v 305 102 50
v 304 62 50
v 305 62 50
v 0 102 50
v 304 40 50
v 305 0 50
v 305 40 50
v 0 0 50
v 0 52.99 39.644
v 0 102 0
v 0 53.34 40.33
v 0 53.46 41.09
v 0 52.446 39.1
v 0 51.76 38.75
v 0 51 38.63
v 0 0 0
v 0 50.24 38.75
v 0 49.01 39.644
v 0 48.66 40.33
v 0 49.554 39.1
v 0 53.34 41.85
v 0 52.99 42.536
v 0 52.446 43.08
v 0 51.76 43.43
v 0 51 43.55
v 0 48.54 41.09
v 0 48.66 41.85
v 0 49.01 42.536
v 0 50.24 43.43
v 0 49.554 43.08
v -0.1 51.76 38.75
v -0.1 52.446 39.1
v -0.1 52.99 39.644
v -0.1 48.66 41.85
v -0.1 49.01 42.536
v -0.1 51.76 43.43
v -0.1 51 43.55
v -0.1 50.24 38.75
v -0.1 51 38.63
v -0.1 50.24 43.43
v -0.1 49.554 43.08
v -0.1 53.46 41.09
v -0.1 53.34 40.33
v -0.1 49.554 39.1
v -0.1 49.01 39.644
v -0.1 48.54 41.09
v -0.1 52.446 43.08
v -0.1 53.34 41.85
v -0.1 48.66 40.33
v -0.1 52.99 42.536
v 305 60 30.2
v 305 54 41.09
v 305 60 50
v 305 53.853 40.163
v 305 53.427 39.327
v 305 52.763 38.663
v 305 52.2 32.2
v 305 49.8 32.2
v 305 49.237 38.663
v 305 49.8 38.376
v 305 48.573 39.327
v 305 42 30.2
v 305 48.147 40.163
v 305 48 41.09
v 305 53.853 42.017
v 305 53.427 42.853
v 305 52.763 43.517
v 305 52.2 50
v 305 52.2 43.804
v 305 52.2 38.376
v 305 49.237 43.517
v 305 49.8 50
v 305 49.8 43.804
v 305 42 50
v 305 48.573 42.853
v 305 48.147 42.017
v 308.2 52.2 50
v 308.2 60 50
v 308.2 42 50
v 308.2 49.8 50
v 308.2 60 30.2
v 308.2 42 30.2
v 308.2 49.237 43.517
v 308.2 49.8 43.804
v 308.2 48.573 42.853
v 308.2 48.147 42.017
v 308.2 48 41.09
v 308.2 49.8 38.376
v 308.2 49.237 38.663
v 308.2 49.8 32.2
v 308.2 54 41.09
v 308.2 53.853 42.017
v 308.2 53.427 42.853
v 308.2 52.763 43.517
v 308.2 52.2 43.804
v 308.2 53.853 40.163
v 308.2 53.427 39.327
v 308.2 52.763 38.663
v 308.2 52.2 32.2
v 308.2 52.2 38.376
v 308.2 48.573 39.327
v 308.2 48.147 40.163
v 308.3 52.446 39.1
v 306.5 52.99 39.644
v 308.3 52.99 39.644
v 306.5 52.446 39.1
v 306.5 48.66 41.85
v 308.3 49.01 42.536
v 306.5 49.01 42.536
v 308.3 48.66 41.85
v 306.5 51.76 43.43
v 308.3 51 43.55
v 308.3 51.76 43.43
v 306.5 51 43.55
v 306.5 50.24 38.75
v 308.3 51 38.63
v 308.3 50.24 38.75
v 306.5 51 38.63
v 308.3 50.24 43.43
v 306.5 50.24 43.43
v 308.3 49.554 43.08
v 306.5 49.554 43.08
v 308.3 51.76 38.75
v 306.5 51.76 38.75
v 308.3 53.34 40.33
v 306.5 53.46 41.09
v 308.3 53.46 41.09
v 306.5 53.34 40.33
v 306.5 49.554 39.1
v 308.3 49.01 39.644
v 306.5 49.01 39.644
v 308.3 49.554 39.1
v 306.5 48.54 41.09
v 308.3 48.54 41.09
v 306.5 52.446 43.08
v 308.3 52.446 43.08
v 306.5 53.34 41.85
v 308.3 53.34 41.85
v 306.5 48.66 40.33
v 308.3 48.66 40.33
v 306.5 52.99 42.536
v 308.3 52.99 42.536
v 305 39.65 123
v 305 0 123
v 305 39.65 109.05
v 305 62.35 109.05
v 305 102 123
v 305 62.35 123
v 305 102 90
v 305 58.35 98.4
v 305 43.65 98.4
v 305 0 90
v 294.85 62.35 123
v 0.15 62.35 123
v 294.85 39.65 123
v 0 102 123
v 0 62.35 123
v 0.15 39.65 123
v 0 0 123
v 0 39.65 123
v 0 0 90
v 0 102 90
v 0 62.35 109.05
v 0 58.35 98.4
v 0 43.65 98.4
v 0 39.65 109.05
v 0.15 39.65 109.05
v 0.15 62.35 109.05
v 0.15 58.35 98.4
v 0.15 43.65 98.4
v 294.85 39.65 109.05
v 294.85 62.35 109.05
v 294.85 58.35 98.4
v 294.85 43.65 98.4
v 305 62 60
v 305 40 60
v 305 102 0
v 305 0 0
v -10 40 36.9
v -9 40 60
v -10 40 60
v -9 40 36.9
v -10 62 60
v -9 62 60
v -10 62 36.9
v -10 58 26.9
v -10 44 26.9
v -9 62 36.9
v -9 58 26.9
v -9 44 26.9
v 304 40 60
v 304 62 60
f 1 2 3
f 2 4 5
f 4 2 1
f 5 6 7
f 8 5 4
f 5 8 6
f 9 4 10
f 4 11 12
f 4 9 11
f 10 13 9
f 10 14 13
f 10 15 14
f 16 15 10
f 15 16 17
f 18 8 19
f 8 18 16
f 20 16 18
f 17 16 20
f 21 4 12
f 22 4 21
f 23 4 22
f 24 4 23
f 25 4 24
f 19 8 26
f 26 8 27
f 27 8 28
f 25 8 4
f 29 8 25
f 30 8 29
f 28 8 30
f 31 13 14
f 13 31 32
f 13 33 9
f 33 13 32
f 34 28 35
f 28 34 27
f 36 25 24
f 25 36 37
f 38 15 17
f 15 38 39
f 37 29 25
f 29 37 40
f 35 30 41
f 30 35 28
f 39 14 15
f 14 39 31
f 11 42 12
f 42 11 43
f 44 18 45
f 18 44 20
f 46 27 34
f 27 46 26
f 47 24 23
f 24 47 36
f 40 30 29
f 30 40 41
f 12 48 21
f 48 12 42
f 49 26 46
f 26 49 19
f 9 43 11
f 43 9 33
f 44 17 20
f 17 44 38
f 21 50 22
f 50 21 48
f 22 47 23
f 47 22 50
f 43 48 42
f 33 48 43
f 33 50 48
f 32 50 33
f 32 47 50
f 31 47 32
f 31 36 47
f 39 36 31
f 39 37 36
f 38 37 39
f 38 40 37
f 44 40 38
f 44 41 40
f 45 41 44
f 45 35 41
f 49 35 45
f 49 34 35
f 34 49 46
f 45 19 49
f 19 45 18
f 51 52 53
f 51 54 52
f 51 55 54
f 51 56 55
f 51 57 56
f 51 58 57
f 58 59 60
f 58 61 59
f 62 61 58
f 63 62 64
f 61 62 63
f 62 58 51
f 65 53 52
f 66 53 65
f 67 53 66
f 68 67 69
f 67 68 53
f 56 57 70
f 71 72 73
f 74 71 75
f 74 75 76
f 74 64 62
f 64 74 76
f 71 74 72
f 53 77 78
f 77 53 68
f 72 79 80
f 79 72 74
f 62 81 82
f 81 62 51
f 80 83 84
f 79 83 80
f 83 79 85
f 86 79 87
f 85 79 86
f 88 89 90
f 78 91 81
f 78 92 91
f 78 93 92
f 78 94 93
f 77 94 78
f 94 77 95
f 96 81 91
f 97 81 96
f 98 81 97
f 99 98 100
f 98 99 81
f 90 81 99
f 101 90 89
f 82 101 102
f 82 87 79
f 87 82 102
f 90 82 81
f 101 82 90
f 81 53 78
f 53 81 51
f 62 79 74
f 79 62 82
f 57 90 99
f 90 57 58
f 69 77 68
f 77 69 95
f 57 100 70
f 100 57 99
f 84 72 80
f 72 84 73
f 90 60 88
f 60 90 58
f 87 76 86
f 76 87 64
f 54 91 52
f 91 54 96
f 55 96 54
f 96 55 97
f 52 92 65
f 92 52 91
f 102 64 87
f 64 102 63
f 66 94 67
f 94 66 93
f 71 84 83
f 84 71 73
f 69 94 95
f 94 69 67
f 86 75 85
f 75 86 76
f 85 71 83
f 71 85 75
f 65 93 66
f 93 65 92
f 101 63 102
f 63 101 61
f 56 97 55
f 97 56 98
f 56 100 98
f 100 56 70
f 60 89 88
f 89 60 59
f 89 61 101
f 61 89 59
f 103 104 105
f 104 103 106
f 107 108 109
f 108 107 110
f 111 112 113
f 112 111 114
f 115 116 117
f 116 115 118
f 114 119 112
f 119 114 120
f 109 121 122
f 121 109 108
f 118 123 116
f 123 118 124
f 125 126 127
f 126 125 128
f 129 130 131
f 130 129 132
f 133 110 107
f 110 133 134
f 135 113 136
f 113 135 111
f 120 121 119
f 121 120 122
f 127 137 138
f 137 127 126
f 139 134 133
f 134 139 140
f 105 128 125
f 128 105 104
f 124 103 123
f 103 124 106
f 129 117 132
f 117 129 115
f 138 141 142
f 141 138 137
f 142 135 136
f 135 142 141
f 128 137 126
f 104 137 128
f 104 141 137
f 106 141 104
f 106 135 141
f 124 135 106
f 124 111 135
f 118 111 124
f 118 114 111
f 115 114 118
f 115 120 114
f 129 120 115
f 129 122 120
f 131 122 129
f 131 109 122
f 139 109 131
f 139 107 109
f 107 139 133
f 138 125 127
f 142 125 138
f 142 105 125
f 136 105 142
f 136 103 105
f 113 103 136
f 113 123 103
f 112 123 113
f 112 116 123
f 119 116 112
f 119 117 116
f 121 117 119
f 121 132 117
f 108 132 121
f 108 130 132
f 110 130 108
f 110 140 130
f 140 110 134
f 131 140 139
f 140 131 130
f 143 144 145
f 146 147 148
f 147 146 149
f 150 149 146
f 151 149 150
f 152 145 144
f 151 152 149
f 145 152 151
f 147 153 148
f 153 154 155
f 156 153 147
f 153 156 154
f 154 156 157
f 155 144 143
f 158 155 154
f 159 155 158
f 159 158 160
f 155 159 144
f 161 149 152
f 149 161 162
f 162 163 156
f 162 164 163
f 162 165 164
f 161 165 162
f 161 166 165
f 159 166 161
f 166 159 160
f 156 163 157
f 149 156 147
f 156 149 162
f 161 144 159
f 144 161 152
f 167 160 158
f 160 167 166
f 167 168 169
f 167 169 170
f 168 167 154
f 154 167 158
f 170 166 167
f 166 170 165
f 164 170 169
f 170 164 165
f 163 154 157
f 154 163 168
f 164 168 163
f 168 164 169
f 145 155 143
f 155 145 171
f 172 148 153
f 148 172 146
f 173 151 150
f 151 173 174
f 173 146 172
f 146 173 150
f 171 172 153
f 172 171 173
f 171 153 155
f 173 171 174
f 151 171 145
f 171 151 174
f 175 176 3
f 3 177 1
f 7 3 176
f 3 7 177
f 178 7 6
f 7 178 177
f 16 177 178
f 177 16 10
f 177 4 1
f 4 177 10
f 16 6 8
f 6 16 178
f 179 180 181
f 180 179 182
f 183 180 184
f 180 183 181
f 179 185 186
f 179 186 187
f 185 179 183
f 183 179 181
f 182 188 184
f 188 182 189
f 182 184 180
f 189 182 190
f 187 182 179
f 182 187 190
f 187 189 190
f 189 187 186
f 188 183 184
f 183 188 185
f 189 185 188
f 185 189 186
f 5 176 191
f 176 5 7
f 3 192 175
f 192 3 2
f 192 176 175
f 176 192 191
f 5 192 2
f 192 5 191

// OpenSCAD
// 01_vertical_dovetail_detent.scad
// Vertical dovetail rail on each short end of the stack.
// Upper tray slides DOWN onto lower; a printed spring-tab detent
// clicks into a notch and resists lifting.
// Release: squeeze detent tab, slide upper UP.
//
// explode=0  → engaged (trays together)
// explode=40 → open/exploded

explode = 40;

// Tray dims
lx=305; ly=102; lz=50;   // lower tray
ux=305; uy=102; uz=33;   // upper tray

// Dovetail rail on the short-end OUTER FACE (X=0 and X=lx)
// Rail runs vertically (Z), is centred on Y
dt_w    = 14;   // dovetail narrow width at root
dt_wide = 22;   // dovetail wide width at tip
dt_h    = 10;   // rail depth proud of face
dt_len  = uz*0.7; // rail length (shorter than upper tray height)

// Detent
det_d   = 6;    // ball/bump diameter
tab_w   = 18;
tab_h   = uz*0.6;
tab_t   = 3.2;

module lower_tray() {
    color("SteelBlue",0.85) cube([lx,ly,lz]);
}
module upper_tray() {
    color("LightSkyBlue",0.85) cube([ux,uy,uz]);
}

// Dovetail MALE rail (on lower tray end face)
module dt_rail_male() {
    color("DarkOrange",0.95)
    hull() {
        translate([0, ly/2 - dt_w/2, 0])  cube([dt_h*0.1, dt_w,    dt_len]);
        translate([0, ly/2 - dt_wide/2, dt_h]) cube([dt_h*0.1, dt_wide, dt_len]);
    }
}

// Dovetail FEMALE socket (cut into upper tray end face)
module dt_socket_cut() {
    cl = 0.35;
    hull() {
        translate([0, ly/2 - dt_w/2 - cl, -1])       cube([dt_h+0.2, dt_w+cl*2,    dt_len+2]);
        translate([0, ly/2 - dt_wide/2 - cl, dt_h-cl]) cube([dt_h+0.2, dt_wide+cl*2, dt_len+2]);
    }
}

// Spring detent tab — sits on lower tray end face, snaps into notch on upper tray
module detent_tab(side) {
    s = (side==0) ? 1 : -1;
    // Tab body
    color("Orange",0.92)
    difference() {
        translate([0, ly/2 - tab_w/2, lz - tab_h])
            cube([tab_t, tab_w, tab_h]);
        // Flex slot (vertical centre cut, leaves two finger cantilevers)
        translate([-0.1, ly/2 - 1.2, lz - tab_h + 2])
            cube([tab_t + 0.2, 2.4, tab_h]);
        // Detent bump hole in tab
        translate([tab_t, ly/2, lz - tab_h*0.45])
            rotate([0,-90,0]) cylinder(d=det_d, h=tab_t+0.2, $fn=20);
    }
    // Detent bump protruding outward
    color("DarkOrange",0.95)
    translate([tab_t - det_d*0.25, ly/2, lz - tab_h*0.45])
        rotate([0,-90,0]) cylinder(d=det_d*0.82, h=det_d*0.3, $fn=20);
}

// Detent notch recess cut in upper tray end face
module detent_notch_cut() {
    translate([0, ly/2, -tab_h*0.45 + uz])
        rotate([0,-90,0]) cylinder(d=det_d*0.82+0.4, h=3, $fn=20);
}

// ==== Lower tray assembly ====
difference() {
    lower_tray();
}

// Male dovetail rails on BOTH short ends of lower tray top portion
translate([0 - dt_h, 0, lz - dt_len])
    dt_rail_male();
translate([lx, 0, lz - dt_len])
    mirror([1,0,0]) dt_rail_male();

// Detent tabs on lower tray short ends
detent_tab(0);
translate([lx + tab_t, 0, 0]) mirror([1,0,0]) detent_tab(1);

// ==== Upper tray assembly (lifted by explode) ====
translate([0, 0, lz + explode])
difference() {
    union() {
        upper_tray();
    }
    // Female dovetail sockets in upper tray short-end faces
    translate([-dt_h - 0.05, 0, uz - dt_len - 0.5])
        dt_socket_cut();
    translate([ux + 0.05, 0, uz - dt_len - 0.5])
        mirror([1,0,0]) dt_socket_cut();
    // Detent notch in upper tray end face
    translate([-0.1, 0, 0]) detent_notch_cut();
    translate([ux + 0.1, 0, 0]) mirror([1,0,0]) detent_notch_cut();
}
